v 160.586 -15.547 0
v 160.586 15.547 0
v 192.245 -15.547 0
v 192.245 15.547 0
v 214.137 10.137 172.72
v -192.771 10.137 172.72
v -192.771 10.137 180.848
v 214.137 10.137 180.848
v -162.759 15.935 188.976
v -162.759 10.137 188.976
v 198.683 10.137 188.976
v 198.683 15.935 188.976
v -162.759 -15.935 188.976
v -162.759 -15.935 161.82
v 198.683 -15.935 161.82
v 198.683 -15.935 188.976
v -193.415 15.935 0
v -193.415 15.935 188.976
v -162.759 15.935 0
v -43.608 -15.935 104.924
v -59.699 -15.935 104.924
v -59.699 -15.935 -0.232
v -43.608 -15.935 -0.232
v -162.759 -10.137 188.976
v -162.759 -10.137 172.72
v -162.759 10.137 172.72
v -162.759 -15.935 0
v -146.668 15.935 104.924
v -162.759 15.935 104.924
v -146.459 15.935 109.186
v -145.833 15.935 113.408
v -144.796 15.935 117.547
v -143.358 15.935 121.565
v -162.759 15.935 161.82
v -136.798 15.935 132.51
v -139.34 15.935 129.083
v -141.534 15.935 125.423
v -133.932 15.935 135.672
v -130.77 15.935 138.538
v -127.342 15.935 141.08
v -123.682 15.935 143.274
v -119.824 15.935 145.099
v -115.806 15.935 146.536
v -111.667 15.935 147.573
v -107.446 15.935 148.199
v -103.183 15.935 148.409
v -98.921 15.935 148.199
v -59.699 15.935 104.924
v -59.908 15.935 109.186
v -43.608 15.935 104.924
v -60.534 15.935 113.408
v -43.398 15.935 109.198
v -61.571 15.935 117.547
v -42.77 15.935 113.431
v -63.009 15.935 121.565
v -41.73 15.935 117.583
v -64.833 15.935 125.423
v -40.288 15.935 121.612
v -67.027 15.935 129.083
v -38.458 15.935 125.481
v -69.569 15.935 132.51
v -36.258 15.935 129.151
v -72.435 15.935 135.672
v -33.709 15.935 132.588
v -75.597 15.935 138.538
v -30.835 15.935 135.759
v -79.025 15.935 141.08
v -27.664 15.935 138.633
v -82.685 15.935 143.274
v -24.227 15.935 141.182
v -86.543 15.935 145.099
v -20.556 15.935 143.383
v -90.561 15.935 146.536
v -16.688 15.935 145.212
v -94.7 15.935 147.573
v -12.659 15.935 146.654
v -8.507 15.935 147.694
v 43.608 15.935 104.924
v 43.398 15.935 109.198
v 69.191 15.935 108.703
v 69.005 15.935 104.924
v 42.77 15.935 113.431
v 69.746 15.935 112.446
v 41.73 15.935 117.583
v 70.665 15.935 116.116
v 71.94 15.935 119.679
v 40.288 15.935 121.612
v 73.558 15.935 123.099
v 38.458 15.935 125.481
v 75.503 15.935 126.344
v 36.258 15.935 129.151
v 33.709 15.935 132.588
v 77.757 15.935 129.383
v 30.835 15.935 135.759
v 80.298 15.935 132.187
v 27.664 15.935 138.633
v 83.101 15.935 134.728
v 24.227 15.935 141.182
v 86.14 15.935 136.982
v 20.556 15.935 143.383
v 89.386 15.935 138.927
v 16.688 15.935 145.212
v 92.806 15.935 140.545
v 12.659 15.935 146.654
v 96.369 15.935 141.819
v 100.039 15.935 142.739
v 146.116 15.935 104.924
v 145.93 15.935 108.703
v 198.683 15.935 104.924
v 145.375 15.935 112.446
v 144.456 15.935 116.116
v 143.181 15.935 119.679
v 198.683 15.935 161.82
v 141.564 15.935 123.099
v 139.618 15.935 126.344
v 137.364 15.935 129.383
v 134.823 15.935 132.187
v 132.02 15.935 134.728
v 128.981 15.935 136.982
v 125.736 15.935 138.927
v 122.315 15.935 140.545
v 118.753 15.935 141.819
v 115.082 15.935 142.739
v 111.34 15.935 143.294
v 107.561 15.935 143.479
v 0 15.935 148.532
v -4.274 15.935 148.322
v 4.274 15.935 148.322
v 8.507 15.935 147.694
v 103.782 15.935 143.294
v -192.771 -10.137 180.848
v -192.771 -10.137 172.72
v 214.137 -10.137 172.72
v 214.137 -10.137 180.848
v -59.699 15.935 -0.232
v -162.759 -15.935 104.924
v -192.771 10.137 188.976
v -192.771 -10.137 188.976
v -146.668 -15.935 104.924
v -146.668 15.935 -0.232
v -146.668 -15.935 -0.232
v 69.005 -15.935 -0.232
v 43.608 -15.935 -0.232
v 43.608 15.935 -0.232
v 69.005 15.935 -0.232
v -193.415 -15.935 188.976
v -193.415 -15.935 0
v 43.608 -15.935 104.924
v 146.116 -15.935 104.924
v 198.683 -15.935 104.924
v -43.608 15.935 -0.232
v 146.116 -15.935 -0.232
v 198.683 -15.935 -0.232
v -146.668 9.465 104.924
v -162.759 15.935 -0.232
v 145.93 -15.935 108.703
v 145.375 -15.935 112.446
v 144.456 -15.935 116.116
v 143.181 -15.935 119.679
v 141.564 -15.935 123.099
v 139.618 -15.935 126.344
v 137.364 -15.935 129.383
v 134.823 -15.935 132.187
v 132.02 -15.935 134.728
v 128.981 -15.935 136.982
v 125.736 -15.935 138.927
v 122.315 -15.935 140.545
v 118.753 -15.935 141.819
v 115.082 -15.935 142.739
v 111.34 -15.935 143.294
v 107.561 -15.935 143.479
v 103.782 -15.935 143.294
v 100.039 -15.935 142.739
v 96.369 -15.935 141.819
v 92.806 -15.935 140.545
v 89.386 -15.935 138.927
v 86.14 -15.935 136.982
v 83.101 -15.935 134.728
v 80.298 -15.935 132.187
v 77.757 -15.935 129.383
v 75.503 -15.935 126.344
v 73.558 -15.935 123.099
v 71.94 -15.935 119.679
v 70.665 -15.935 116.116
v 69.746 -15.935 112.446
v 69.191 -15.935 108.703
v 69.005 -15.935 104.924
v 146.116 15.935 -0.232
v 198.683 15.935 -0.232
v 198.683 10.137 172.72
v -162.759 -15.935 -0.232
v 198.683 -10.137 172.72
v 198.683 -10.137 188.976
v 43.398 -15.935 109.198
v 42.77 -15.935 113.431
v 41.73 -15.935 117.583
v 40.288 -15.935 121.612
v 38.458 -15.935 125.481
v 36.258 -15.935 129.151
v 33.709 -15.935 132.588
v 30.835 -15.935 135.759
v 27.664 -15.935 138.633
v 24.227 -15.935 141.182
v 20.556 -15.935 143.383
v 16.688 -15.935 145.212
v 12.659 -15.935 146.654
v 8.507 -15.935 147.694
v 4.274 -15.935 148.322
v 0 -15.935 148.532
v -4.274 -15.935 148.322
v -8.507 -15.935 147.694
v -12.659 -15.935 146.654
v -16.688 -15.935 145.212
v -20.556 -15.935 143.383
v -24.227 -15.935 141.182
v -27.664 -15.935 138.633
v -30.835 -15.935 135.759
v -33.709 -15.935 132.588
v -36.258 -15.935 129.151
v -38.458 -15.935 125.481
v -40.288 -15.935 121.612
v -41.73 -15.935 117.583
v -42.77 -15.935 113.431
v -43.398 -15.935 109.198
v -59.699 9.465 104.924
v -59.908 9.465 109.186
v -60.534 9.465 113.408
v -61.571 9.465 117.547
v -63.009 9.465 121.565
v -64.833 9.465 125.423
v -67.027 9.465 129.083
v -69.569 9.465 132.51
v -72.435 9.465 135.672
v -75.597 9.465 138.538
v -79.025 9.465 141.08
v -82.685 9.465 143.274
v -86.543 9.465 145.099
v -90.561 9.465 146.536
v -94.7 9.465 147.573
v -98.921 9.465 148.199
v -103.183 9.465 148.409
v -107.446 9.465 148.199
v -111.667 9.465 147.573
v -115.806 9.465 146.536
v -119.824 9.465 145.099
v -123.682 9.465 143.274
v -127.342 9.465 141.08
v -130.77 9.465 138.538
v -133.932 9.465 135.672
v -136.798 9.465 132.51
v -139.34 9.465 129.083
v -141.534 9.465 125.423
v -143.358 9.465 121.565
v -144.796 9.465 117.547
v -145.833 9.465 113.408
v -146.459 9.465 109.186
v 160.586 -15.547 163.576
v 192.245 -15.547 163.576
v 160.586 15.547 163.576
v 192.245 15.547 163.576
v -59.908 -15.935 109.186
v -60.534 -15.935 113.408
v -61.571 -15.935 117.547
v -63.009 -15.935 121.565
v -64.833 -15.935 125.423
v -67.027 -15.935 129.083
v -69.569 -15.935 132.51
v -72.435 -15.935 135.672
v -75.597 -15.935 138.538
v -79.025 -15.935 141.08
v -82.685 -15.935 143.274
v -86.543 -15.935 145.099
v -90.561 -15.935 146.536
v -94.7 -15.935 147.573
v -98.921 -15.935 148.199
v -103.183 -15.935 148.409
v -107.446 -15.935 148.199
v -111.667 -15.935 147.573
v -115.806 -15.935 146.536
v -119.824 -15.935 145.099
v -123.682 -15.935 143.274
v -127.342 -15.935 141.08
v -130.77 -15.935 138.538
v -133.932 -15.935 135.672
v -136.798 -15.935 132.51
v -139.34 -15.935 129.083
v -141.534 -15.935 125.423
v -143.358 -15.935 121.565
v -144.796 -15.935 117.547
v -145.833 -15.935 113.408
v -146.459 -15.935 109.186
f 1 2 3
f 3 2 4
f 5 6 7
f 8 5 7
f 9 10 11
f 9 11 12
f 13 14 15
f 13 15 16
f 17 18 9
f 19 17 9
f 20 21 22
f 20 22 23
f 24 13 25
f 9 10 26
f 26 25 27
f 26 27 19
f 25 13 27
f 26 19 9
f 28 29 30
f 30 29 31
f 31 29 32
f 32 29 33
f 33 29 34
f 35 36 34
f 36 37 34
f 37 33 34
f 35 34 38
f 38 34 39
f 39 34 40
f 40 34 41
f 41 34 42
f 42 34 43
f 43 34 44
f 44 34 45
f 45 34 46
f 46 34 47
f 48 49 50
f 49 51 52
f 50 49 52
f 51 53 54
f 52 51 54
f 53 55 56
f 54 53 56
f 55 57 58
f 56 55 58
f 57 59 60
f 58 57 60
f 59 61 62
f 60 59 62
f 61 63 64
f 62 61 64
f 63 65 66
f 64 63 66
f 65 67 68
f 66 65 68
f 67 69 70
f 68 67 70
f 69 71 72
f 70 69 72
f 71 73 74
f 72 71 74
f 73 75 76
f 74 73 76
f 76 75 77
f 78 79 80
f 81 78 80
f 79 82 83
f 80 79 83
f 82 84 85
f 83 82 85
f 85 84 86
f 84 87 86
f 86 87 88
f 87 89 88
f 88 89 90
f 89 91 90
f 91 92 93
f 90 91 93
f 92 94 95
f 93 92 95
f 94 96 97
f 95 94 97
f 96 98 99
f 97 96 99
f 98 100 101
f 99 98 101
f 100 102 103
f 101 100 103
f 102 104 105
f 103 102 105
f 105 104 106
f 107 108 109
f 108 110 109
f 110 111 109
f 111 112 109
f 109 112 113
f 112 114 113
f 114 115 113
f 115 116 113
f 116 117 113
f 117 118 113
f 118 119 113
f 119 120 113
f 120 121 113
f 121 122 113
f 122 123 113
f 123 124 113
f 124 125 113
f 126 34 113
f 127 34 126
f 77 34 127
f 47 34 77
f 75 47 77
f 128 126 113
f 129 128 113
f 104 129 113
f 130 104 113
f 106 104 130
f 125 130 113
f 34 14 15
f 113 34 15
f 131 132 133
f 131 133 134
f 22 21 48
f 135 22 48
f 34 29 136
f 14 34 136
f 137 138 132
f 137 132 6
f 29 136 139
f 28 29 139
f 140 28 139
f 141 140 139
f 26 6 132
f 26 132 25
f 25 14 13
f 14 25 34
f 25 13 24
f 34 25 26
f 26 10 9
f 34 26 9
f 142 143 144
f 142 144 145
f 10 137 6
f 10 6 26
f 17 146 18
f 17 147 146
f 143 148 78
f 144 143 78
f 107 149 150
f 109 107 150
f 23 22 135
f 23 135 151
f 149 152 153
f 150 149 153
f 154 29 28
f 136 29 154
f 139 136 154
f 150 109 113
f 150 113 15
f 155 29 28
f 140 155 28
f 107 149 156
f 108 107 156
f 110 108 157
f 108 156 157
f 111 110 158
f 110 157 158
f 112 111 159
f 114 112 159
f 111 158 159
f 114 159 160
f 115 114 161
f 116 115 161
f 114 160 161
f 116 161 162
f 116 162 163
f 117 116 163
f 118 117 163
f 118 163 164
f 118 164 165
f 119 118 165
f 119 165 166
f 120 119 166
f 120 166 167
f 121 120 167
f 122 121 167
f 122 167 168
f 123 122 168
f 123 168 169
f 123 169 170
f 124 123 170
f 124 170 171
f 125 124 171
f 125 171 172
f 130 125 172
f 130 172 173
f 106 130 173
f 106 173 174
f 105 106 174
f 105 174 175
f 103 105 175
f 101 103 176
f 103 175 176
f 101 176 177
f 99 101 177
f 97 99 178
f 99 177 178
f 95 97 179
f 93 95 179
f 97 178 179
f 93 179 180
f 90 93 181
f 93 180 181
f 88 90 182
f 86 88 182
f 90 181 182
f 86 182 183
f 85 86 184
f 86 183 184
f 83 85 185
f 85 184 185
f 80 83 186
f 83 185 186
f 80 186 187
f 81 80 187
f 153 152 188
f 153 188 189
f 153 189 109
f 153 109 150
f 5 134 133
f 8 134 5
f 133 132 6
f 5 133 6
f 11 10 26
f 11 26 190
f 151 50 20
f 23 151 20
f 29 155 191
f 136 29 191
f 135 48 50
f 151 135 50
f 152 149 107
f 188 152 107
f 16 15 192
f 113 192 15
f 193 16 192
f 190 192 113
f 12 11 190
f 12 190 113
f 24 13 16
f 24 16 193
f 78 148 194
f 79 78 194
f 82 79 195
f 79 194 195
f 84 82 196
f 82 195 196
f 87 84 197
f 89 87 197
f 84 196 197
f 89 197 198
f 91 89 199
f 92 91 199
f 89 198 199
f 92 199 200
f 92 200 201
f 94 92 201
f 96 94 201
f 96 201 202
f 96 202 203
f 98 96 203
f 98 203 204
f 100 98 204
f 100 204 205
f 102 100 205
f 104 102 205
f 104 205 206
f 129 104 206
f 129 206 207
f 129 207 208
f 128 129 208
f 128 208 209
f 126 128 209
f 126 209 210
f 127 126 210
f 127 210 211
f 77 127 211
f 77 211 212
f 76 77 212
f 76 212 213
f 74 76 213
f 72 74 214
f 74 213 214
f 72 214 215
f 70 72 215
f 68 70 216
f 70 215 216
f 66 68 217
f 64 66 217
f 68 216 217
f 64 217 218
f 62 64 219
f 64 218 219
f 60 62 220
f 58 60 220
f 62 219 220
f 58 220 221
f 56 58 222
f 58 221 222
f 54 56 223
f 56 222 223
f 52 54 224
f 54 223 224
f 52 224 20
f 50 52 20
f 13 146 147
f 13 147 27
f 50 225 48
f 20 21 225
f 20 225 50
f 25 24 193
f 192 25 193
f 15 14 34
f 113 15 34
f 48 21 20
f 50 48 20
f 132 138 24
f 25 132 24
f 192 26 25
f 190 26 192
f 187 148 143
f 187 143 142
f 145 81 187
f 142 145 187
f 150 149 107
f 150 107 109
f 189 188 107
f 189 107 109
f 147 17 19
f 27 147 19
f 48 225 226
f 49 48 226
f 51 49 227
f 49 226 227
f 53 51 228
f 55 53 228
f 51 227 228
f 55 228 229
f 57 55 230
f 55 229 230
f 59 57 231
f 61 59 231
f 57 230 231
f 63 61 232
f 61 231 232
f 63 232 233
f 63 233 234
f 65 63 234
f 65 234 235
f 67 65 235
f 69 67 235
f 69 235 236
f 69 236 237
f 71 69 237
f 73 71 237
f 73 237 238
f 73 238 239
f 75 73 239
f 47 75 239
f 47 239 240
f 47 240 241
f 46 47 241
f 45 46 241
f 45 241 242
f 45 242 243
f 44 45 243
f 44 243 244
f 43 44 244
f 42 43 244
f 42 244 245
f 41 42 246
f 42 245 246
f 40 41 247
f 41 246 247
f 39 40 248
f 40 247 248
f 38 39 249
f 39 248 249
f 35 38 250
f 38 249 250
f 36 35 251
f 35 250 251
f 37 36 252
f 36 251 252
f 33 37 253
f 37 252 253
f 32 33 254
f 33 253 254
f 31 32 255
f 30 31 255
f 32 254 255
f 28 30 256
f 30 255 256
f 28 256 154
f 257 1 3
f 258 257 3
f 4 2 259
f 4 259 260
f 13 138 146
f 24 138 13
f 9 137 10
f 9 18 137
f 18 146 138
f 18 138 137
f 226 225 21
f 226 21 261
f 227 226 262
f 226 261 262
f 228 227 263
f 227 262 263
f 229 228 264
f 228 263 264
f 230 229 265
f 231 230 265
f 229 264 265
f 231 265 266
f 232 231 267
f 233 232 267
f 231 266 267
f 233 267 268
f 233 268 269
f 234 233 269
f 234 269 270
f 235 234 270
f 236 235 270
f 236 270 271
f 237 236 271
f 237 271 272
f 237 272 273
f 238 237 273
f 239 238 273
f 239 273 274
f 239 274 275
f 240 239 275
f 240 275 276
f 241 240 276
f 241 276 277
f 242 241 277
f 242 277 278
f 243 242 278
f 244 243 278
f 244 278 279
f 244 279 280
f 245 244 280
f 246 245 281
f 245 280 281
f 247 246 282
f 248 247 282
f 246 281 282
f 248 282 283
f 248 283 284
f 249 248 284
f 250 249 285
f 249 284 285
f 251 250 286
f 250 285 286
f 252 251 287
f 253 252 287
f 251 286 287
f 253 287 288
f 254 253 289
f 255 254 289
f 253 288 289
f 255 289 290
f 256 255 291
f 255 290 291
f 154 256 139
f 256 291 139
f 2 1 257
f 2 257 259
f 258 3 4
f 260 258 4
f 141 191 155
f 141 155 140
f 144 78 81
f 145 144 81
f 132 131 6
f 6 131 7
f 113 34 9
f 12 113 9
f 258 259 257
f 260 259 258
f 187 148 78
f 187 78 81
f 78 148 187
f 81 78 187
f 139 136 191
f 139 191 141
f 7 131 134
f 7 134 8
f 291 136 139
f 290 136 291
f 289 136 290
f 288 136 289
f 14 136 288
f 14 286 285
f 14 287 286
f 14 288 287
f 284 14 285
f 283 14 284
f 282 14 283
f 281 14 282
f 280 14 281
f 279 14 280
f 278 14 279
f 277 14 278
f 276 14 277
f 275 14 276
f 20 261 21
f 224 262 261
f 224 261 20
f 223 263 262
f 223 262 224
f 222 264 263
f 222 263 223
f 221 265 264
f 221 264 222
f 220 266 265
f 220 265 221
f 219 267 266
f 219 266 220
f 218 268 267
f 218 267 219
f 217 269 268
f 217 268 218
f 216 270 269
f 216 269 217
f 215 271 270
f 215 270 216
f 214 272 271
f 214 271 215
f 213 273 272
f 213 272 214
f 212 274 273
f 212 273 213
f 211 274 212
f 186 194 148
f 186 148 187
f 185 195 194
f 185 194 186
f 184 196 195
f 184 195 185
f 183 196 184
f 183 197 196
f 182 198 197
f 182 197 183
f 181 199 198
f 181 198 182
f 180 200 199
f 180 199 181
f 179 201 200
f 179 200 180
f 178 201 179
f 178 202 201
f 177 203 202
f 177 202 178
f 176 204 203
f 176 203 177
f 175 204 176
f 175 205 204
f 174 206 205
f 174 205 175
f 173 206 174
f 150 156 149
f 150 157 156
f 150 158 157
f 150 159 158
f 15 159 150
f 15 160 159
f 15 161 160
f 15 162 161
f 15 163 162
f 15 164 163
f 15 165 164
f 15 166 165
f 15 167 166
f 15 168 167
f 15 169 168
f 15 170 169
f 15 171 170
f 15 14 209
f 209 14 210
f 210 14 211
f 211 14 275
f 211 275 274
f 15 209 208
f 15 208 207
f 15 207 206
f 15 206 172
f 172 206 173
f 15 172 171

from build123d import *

# Parameters (mm, degrees)
F0_W      = 31.6595733166
F0_H      = 31.0939885676
F1_DEPTH  = 163.576
F0_W_2    = 30.6557416916
F0_H_2    = 31.8693220615
F2_DEPTH  = 25.4
F3_W      = 30.6557416916
F3_H      = 31.8693220615
F4_DEPTH  = 25.4
F5_W      = 31.8693220615
F5_H      = 27.1559161434
F6_DEPTH  = 361.442
F7_W      = 385.542601347
F7_H      = 20.2748756856
F8_DEPTH  = 16.256
F9_DEPTH  = 75.438
F10_W     = 361.442
F10_H     = 31.8693220615
F11_DEPTH = 56.896
F12_R     = 43.6075733788
F13_DEPTH = 114.046
F14_R     = 43.4846750127
F15_DEPTH = 25.4
F16_DEPTH = 183.134
F17_R     = 38.5553943077
F18_DEPTH = 45.974
F19_DEPTH = 105.156
F20_W     = 20.2748756856
F20_H     = 8.128
F21_DEPTH = 406.908


with BuildPart() as f1:
    # F0 (on Top) → F1 (new body)
    with BuildSketch(Plane.XY):
        with Locations((176.4155030251, 0)):
            Rectangle(F0_W, F0_H)
    extrude(amount=F1_DEPTH)


with BuildPart() as f1b:
    # F0 (on Top) → F1, piece 2 (new body)
    with BuildSketch(Plane.XY):
        with Locations((-178.0872792006, 0)):
            Rectangle(F0_W_2, F0_H_2)
    extrude(amount=F1_DEPTH)

    # F2 (add): a face of the model
    f2_faces = [f1b.faces().sort_by_distance(p)[0] for p in [
        (-178.0872792006, 0, 163.576),
    ]]
    extrude(f2_faces, amount=F2_DEPTH)

    # F3 (on face) → F4 (join)
    with BuildSketch(Plane.XY.offset(188.976)):
        with Locations((-178.0872792006, 0)):
            Rectangle(F3_W, F3_H)
    extrude(amount=-F4_DEPTH)


with BuildPart() as f6:
    # F5 (on face) → F6 (new body)
    with BuildSketch(Plane.YZ.offset(-162.7594083548)):
        with Locations((0, 175.3980419283)):
            Rectangle(F5_W, F5_H)
    extrude(amount=F6_DEPTH)


with BuildPart() as f8_tool:
    # F7 (on face) → F8 (new body)
    with BuildSketch(Plane.XY.offset(188.976)):
        Rectangle(F7_W, F7_H)
    extrude(amount=-F8_DEPTH)


with BuildPart() as f1b_1:
    add(f1b.part)

    # F8: cut by f8_tool
    add(f8_tool.part, mode=Mode.SUBTRACT)


with BuildPart() as f6_1:
    add(f6.part)

    # F8: cut by f8_tool
    add(f8_tool.part, mode=Mode.SUBTRACT)

    # F9 (cut): a face of the model
    f9_faces = [f6_1.faces().sort_by_distance(p)[0] for p in [
        (192.7713006735, 0, 180.848),
    ]]
    extrude(f9_faces, amount=-F9_DEPTH, mode=Mode.SUBTRACT)


with BuildPart() as f11:
    # F10 (on face) → F11 (new body)
    with BuildSketch(Plane(origin=(0, 0, 161.8200838566), x_dir=(1, 0, 0), z_dir=(0, 0, -1))):
        with Locations((17.9615916452, 0)):
            Rectangle(F10_W, F10_H)
    extrude(amount=F11_DEPTH)

    # F12 (on face) → F13 (cut)
    with BuildSketch(Plane.XZ.offset(15.9346610308)):
        with Locations((0, 104.9240838566)):
            Circle(F12_R)
    extrude(amount=-F13_DEPTH, mode=Mode.SUBTRACT)

    # F14 (on face) → F15 (cut)
    with BuildSketch(Plane.XZ.offset(15.9346610308)):
        with Locations((-103.1834908668, 104.9240838566)):
            Circle(F14_R)
    extrude(amount=-F15_DEPTH, mode=Mode.SUBTRACT)

    # F16 (cut): a face of the model
    f16_faces = [f11.faces().sort_by_distance(p)[0] for p in [
        (-103.1834908668, 9.4653389692, 123.3795531286),
    ]]
    extrude(f16_faces, amount=-F16_DEPTH, mode=Mode.SUBTRACT)

    # F17 (on face) → F18 (cut)
    with BuildSketch(Plane.XZ.offset(15.9346610308)):
        with Locations((107.5606942177, 104.9240838566)):
            Circle(F17_R)
    extrude(amount=-F18_DEPTH, mode=Mode.SUBTRACT)


with BuildPart() as f19:
    # F19 (new): a face of the model
    f19_faces = [f11.part.faces().sort_by_distance(p)[0] for p in [
        (-51.6531946164, 0, 104.9240838566),
    ]]
    extrude(f19_faces, amount=F19_DEPTH)


with BuildPart() as f19b:
    # F19#2 (new): a face of the model
    f19_2_faces = [f11.part.faces().sort_by_distance(p)[0] for p in [
        (56.3064366444, 0, 104.9240838566),
    ]]
    extrude(f19_2_faces, amount=F19_DEPTH)


with BuildPart() as f19c:
    # F19#3 (new): a face of the model
    f19_3_faces = [f11.part.faces().sort_by_distance(p)[0] for p in [
        (-154.7137871171, 0, 104.9240838566),
    ]]
    extrude(f19_3_faces, amount=F19_DEPTH)


with BuildPart() as f19d:
    # F19#4 (new): a face of the model
    f19_4_faces = [f11.part.faces().sort_by_distance(p)[0] for p in [
        (172.3993400853, 0, 104.9240838566),
    ]]
    extrude(f19_4_faces, amount=F19_DEPTH)


with BuildPart() as f21:
    # F20 (on face) → F21 (new body)
    with BuildSketch(Plane.YZ.offset(-192.7713006735)):
        with Locations((0, 176.784)):
            Rectangle(F20_W, F20_H)
    extrude(amount=F21_DEPTH)


solid = Compound([f1.part, f1b_1.part, f6_1.part, f11.part, f19.part, f19b.part, f19c.part, f19d.part, f21.part])
